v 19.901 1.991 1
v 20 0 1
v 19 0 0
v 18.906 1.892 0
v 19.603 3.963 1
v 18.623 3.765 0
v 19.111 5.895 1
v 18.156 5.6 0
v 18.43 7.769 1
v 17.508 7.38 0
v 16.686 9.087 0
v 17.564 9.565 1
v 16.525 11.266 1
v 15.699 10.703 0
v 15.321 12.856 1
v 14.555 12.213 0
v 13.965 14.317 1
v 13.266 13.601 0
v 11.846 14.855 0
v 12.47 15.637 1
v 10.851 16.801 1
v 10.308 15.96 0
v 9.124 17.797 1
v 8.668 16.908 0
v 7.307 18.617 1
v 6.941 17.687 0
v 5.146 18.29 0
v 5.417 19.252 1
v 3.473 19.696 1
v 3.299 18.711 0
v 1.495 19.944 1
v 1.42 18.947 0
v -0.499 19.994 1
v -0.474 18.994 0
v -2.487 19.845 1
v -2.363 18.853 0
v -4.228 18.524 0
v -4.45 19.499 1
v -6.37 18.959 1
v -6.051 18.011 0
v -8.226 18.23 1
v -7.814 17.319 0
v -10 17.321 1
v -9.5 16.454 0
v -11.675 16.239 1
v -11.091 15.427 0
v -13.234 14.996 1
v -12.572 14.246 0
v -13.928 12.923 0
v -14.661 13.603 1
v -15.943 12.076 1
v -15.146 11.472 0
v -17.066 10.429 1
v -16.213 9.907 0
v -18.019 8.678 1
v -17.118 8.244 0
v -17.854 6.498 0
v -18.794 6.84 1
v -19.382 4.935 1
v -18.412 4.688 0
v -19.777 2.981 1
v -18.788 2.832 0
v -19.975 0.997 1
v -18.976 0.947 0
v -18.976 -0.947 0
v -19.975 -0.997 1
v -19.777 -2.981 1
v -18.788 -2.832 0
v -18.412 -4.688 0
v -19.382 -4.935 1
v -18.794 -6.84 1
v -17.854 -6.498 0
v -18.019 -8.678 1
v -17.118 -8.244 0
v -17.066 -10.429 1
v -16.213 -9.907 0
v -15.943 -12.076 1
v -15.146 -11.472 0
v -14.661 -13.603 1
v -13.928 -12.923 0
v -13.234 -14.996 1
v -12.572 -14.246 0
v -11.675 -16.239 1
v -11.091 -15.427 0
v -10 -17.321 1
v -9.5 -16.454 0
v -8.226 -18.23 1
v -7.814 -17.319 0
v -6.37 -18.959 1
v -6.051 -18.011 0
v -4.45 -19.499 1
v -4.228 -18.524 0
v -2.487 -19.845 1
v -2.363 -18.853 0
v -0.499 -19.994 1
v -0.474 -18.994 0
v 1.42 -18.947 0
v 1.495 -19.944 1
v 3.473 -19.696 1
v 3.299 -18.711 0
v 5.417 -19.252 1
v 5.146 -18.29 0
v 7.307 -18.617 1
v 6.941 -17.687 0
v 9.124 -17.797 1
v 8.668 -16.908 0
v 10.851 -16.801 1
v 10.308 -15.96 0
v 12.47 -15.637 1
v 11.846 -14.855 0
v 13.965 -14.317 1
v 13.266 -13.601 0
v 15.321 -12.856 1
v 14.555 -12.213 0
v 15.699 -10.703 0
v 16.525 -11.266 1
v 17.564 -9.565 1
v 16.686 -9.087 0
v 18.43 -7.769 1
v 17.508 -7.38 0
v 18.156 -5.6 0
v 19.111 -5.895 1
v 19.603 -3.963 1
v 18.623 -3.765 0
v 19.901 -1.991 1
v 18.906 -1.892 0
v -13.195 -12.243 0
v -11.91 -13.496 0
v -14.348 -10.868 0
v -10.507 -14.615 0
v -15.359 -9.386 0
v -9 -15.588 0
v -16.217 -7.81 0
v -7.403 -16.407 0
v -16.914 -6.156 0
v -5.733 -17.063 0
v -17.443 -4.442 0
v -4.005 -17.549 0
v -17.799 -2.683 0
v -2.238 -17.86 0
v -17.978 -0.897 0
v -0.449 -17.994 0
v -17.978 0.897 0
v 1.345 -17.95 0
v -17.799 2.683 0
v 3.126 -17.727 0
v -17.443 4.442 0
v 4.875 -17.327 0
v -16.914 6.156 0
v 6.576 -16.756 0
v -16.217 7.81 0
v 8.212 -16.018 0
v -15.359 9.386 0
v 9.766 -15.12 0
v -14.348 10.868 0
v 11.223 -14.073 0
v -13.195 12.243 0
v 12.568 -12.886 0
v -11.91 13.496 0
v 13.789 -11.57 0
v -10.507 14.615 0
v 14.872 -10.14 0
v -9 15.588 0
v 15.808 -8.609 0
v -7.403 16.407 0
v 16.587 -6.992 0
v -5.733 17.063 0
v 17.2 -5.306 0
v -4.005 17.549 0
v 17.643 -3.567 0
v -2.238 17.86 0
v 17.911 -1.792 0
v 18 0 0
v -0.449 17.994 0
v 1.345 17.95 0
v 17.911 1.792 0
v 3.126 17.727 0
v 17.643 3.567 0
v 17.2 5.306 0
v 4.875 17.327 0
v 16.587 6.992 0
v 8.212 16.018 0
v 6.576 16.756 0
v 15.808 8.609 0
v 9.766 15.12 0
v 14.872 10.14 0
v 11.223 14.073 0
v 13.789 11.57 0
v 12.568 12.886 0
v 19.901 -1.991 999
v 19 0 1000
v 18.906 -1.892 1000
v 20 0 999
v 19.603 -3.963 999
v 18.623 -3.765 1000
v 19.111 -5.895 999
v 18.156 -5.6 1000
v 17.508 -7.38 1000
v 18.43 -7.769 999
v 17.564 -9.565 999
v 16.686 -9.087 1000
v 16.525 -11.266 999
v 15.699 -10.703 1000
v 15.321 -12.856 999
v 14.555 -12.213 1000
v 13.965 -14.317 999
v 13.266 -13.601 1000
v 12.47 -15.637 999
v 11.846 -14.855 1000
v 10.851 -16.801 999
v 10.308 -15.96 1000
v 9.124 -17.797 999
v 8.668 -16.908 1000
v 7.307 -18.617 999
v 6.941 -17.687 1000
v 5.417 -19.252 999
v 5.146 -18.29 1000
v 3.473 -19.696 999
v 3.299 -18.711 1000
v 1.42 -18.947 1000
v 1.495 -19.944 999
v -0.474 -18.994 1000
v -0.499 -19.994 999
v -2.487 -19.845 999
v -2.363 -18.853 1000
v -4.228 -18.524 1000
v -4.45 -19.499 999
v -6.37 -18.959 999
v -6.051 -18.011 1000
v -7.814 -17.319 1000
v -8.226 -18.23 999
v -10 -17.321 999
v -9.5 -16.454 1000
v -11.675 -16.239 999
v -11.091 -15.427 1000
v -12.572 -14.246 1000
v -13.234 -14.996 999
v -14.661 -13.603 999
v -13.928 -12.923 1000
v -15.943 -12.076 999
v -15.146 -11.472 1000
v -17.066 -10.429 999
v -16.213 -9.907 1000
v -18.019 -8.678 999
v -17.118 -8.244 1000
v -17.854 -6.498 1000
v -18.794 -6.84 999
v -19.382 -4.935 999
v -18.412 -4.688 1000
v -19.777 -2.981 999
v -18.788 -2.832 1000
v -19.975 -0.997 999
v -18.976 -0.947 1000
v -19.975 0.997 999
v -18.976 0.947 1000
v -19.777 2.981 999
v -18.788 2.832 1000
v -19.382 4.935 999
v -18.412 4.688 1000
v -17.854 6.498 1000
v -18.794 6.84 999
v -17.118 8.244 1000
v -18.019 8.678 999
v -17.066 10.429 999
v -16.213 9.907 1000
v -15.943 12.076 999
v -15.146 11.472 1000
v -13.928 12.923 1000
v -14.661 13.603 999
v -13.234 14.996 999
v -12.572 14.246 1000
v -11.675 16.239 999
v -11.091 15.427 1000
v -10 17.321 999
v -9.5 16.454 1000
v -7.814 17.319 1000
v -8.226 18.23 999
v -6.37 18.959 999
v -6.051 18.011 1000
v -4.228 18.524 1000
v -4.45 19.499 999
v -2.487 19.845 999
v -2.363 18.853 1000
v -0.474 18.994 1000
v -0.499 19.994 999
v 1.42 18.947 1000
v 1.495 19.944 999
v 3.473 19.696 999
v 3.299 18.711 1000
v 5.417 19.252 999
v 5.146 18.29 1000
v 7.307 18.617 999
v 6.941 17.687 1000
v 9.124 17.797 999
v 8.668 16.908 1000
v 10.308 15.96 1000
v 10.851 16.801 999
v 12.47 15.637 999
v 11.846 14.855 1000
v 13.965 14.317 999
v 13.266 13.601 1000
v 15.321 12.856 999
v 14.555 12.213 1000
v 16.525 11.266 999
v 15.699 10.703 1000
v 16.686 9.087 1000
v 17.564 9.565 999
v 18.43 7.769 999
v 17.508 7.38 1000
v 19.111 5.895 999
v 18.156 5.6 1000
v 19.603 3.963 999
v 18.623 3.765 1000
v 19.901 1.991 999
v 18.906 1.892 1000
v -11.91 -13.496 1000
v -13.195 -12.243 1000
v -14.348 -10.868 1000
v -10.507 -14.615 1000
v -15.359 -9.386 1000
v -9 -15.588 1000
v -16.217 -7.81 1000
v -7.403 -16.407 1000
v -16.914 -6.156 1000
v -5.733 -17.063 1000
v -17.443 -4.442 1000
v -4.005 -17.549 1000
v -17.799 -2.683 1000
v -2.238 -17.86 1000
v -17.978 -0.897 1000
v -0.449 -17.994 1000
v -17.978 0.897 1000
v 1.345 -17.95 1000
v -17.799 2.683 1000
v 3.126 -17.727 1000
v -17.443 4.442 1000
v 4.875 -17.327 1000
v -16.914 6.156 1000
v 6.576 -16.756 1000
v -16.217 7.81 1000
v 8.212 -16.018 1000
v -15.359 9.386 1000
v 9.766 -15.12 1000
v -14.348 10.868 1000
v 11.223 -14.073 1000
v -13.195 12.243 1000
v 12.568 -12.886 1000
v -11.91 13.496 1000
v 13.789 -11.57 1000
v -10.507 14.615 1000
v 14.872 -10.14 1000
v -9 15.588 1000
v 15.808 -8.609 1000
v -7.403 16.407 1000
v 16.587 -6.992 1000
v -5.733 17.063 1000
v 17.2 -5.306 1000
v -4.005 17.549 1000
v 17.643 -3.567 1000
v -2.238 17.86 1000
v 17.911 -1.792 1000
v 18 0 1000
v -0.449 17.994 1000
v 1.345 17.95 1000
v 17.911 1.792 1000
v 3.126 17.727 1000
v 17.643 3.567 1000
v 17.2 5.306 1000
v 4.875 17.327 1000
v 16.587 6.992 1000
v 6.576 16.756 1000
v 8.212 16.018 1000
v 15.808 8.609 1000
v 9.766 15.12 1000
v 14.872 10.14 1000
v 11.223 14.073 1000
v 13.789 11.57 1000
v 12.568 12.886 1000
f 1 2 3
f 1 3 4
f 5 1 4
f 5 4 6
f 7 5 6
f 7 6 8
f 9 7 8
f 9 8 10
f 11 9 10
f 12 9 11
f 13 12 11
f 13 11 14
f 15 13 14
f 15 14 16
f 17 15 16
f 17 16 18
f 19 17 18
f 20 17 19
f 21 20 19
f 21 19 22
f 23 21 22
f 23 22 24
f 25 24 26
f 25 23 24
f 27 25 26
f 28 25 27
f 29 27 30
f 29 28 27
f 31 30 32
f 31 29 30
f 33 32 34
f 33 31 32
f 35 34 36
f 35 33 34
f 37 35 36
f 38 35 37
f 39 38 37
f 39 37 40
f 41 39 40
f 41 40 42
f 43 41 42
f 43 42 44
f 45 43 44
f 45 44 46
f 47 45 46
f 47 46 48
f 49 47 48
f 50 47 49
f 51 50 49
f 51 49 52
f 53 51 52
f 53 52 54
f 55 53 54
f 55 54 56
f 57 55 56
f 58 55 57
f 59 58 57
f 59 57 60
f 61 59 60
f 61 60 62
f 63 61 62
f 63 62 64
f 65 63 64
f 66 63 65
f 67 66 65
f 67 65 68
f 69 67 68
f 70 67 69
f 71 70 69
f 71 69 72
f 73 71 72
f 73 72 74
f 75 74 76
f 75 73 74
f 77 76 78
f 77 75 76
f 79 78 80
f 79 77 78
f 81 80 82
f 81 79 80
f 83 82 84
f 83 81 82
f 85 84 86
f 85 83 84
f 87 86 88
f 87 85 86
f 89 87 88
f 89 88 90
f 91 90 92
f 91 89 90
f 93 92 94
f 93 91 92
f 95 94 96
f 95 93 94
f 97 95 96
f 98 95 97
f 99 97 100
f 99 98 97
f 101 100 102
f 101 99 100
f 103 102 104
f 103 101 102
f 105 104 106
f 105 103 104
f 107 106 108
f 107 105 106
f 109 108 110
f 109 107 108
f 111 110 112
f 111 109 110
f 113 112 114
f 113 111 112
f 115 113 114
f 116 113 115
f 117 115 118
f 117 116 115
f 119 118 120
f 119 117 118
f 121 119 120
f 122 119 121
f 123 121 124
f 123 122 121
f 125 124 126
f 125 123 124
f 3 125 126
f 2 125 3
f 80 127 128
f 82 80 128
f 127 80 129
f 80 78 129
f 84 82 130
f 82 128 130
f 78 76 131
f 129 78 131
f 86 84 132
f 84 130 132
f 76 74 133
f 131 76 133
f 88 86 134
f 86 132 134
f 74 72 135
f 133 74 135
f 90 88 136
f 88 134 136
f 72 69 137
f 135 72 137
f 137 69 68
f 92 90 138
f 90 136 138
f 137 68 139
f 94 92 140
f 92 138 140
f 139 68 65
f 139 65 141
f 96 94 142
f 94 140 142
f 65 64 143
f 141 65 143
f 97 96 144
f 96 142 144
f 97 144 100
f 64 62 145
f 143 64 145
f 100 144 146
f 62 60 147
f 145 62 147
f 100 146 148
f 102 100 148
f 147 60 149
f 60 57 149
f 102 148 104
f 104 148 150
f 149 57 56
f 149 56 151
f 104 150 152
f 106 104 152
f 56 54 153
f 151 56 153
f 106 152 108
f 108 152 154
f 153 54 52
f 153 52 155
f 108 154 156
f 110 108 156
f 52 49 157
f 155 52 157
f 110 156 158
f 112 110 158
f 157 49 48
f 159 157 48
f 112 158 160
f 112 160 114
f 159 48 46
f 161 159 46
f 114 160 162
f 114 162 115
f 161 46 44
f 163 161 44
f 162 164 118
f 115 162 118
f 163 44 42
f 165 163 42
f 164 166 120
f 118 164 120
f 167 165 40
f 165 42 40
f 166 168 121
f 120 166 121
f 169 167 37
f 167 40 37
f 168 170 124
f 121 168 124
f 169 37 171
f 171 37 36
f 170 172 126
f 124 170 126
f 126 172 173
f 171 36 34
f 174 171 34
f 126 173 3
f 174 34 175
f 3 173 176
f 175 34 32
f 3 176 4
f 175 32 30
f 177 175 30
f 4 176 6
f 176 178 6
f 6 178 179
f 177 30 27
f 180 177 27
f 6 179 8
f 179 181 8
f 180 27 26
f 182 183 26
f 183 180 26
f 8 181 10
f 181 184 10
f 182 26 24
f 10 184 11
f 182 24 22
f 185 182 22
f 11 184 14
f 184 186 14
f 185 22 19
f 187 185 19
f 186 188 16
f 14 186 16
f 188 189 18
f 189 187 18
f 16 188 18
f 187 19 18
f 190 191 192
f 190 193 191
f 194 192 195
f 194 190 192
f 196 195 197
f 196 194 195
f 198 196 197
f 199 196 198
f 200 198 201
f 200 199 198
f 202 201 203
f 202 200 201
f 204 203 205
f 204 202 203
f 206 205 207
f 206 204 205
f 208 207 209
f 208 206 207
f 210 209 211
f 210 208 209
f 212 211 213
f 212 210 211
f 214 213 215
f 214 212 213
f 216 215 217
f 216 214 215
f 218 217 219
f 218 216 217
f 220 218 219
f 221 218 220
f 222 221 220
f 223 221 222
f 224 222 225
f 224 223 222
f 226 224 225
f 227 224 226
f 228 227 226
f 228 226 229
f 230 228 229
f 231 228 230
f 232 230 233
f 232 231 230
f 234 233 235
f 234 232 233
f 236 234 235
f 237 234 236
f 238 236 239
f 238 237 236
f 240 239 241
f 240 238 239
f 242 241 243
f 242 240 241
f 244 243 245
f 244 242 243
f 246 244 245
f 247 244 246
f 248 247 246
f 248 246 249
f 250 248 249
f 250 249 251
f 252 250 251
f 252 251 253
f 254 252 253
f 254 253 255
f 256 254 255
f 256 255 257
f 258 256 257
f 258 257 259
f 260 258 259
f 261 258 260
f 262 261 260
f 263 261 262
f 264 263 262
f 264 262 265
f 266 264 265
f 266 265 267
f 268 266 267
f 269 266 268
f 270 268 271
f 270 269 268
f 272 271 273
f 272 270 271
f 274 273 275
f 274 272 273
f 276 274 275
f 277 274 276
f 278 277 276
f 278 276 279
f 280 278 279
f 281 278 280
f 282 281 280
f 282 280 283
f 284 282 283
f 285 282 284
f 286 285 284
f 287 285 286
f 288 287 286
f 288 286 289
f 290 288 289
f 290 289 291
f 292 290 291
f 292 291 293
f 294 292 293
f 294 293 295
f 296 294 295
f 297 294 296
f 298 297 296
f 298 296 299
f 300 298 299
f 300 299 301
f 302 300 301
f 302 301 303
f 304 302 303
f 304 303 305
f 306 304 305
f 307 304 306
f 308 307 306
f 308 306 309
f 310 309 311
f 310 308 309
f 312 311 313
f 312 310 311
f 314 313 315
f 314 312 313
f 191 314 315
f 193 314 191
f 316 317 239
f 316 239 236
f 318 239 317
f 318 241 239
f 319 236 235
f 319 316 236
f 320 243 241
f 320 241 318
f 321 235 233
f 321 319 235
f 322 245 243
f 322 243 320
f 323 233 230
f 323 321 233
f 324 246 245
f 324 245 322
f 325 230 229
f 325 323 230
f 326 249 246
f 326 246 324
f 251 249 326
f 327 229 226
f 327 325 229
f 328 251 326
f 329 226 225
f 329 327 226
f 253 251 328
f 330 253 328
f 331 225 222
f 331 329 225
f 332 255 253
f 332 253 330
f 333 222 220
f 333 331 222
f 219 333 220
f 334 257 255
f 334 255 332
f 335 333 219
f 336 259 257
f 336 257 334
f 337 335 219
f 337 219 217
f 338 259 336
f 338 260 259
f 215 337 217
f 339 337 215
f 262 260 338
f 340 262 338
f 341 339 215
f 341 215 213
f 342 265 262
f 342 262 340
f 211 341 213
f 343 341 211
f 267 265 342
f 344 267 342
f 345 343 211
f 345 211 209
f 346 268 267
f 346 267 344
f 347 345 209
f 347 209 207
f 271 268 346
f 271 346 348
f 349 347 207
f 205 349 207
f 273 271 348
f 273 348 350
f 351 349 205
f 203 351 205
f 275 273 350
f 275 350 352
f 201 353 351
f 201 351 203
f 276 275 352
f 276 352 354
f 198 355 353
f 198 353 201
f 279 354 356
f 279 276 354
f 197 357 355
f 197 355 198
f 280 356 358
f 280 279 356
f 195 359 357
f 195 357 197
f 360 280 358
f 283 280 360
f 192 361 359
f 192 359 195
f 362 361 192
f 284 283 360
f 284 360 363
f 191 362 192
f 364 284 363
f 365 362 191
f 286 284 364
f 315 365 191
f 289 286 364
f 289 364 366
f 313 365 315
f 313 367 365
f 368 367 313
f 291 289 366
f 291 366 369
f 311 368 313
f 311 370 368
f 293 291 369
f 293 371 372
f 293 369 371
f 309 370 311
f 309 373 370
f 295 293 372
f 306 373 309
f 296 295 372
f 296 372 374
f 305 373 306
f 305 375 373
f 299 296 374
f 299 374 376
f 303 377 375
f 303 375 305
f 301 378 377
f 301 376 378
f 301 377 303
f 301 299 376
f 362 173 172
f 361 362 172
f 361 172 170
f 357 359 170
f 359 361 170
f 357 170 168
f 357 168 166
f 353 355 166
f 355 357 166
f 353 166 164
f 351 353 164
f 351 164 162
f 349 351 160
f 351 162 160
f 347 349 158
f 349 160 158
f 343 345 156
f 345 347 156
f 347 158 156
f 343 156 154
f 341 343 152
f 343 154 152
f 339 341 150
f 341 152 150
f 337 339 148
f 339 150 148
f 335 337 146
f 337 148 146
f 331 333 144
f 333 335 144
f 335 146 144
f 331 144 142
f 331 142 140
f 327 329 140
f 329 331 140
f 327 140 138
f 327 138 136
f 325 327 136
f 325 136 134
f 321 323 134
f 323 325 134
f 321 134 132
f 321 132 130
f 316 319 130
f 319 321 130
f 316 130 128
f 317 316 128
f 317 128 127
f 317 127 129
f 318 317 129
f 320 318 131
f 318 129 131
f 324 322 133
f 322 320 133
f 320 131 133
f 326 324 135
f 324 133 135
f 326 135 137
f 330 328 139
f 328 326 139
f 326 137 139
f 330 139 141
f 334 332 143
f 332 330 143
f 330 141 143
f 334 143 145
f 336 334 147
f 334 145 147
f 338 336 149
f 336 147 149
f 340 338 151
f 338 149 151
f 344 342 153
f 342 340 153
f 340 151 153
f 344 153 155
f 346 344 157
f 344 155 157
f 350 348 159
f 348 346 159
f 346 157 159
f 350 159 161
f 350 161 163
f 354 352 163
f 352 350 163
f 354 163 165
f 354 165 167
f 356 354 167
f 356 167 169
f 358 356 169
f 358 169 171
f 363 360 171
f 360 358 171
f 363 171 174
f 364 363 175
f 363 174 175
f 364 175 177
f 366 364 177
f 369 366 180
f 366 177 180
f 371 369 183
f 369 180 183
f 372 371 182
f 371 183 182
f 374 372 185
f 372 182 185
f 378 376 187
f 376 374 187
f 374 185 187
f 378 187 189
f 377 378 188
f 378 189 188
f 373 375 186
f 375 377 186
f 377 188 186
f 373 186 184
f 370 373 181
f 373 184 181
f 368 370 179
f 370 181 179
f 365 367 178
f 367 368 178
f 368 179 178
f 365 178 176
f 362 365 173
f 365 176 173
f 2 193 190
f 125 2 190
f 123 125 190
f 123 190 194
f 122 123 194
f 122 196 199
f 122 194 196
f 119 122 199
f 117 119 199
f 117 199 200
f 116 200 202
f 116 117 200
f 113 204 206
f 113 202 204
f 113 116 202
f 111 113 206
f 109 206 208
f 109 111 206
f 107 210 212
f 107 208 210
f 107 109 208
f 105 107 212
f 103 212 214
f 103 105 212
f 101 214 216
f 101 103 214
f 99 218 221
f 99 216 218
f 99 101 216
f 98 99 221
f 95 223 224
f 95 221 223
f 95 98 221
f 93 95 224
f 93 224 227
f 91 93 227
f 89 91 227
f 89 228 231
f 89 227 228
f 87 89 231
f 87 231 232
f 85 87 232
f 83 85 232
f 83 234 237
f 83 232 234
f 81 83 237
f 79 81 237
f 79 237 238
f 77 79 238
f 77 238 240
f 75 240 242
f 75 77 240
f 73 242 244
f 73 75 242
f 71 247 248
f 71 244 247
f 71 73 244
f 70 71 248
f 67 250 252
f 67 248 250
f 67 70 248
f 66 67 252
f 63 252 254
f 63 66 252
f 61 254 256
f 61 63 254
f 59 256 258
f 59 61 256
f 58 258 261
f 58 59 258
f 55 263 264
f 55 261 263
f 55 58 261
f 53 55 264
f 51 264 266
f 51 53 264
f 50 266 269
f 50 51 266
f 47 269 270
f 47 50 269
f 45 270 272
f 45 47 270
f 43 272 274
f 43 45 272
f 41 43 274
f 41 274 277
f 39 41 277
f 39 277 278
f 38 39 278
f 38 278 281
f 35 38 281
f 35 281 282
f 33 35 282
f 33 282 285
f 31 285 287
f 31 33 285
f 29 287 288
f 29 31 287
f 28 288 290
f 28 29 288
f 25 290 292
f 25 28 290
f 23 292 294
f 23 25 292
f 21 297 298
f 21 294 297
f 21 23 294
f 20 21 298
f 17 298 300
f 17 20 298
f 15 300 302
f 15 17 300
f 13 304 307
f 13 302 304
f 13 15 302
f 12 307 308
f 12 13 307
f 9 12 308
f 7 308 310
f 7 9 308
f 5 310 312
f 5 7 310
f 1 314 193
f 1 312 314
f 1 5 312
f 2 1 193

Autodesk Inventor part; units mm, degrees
ref_plane "YZ Plane" through (0, 0, 0) normal (1, 0, 0) x (0, 1, 0)
ref_plane "XZ Plane" through (0, 0, 0) normal (0, 1, 0) x (-1, 0, 0)
ref_plane "XY Plane" through (0, 0, 0) normal (0, 0, 1) x (1, 0, 0)
sketch "Sketch1" plane through (0, 0, 0) normal (0, 0, 1) x (1, 0, 0)
  circle A0 centre (0, 0) radius 20
  circle A1 centre (0, 0) radius 18
  dimension "d0" = 40
  dimension "d1" = 2
extrude "Extrusion1" add sketch "Sketch1" along normal blind 1000
chamfer "Chamfer1" distance 1 angle 45 1 edges at (-20, 0, 1000)
chamfer "Chamfer2" distance 1 angle 45 1 edges at (-20, 0, 0)
properties part number "STK00-001" material "Polypropylene"
